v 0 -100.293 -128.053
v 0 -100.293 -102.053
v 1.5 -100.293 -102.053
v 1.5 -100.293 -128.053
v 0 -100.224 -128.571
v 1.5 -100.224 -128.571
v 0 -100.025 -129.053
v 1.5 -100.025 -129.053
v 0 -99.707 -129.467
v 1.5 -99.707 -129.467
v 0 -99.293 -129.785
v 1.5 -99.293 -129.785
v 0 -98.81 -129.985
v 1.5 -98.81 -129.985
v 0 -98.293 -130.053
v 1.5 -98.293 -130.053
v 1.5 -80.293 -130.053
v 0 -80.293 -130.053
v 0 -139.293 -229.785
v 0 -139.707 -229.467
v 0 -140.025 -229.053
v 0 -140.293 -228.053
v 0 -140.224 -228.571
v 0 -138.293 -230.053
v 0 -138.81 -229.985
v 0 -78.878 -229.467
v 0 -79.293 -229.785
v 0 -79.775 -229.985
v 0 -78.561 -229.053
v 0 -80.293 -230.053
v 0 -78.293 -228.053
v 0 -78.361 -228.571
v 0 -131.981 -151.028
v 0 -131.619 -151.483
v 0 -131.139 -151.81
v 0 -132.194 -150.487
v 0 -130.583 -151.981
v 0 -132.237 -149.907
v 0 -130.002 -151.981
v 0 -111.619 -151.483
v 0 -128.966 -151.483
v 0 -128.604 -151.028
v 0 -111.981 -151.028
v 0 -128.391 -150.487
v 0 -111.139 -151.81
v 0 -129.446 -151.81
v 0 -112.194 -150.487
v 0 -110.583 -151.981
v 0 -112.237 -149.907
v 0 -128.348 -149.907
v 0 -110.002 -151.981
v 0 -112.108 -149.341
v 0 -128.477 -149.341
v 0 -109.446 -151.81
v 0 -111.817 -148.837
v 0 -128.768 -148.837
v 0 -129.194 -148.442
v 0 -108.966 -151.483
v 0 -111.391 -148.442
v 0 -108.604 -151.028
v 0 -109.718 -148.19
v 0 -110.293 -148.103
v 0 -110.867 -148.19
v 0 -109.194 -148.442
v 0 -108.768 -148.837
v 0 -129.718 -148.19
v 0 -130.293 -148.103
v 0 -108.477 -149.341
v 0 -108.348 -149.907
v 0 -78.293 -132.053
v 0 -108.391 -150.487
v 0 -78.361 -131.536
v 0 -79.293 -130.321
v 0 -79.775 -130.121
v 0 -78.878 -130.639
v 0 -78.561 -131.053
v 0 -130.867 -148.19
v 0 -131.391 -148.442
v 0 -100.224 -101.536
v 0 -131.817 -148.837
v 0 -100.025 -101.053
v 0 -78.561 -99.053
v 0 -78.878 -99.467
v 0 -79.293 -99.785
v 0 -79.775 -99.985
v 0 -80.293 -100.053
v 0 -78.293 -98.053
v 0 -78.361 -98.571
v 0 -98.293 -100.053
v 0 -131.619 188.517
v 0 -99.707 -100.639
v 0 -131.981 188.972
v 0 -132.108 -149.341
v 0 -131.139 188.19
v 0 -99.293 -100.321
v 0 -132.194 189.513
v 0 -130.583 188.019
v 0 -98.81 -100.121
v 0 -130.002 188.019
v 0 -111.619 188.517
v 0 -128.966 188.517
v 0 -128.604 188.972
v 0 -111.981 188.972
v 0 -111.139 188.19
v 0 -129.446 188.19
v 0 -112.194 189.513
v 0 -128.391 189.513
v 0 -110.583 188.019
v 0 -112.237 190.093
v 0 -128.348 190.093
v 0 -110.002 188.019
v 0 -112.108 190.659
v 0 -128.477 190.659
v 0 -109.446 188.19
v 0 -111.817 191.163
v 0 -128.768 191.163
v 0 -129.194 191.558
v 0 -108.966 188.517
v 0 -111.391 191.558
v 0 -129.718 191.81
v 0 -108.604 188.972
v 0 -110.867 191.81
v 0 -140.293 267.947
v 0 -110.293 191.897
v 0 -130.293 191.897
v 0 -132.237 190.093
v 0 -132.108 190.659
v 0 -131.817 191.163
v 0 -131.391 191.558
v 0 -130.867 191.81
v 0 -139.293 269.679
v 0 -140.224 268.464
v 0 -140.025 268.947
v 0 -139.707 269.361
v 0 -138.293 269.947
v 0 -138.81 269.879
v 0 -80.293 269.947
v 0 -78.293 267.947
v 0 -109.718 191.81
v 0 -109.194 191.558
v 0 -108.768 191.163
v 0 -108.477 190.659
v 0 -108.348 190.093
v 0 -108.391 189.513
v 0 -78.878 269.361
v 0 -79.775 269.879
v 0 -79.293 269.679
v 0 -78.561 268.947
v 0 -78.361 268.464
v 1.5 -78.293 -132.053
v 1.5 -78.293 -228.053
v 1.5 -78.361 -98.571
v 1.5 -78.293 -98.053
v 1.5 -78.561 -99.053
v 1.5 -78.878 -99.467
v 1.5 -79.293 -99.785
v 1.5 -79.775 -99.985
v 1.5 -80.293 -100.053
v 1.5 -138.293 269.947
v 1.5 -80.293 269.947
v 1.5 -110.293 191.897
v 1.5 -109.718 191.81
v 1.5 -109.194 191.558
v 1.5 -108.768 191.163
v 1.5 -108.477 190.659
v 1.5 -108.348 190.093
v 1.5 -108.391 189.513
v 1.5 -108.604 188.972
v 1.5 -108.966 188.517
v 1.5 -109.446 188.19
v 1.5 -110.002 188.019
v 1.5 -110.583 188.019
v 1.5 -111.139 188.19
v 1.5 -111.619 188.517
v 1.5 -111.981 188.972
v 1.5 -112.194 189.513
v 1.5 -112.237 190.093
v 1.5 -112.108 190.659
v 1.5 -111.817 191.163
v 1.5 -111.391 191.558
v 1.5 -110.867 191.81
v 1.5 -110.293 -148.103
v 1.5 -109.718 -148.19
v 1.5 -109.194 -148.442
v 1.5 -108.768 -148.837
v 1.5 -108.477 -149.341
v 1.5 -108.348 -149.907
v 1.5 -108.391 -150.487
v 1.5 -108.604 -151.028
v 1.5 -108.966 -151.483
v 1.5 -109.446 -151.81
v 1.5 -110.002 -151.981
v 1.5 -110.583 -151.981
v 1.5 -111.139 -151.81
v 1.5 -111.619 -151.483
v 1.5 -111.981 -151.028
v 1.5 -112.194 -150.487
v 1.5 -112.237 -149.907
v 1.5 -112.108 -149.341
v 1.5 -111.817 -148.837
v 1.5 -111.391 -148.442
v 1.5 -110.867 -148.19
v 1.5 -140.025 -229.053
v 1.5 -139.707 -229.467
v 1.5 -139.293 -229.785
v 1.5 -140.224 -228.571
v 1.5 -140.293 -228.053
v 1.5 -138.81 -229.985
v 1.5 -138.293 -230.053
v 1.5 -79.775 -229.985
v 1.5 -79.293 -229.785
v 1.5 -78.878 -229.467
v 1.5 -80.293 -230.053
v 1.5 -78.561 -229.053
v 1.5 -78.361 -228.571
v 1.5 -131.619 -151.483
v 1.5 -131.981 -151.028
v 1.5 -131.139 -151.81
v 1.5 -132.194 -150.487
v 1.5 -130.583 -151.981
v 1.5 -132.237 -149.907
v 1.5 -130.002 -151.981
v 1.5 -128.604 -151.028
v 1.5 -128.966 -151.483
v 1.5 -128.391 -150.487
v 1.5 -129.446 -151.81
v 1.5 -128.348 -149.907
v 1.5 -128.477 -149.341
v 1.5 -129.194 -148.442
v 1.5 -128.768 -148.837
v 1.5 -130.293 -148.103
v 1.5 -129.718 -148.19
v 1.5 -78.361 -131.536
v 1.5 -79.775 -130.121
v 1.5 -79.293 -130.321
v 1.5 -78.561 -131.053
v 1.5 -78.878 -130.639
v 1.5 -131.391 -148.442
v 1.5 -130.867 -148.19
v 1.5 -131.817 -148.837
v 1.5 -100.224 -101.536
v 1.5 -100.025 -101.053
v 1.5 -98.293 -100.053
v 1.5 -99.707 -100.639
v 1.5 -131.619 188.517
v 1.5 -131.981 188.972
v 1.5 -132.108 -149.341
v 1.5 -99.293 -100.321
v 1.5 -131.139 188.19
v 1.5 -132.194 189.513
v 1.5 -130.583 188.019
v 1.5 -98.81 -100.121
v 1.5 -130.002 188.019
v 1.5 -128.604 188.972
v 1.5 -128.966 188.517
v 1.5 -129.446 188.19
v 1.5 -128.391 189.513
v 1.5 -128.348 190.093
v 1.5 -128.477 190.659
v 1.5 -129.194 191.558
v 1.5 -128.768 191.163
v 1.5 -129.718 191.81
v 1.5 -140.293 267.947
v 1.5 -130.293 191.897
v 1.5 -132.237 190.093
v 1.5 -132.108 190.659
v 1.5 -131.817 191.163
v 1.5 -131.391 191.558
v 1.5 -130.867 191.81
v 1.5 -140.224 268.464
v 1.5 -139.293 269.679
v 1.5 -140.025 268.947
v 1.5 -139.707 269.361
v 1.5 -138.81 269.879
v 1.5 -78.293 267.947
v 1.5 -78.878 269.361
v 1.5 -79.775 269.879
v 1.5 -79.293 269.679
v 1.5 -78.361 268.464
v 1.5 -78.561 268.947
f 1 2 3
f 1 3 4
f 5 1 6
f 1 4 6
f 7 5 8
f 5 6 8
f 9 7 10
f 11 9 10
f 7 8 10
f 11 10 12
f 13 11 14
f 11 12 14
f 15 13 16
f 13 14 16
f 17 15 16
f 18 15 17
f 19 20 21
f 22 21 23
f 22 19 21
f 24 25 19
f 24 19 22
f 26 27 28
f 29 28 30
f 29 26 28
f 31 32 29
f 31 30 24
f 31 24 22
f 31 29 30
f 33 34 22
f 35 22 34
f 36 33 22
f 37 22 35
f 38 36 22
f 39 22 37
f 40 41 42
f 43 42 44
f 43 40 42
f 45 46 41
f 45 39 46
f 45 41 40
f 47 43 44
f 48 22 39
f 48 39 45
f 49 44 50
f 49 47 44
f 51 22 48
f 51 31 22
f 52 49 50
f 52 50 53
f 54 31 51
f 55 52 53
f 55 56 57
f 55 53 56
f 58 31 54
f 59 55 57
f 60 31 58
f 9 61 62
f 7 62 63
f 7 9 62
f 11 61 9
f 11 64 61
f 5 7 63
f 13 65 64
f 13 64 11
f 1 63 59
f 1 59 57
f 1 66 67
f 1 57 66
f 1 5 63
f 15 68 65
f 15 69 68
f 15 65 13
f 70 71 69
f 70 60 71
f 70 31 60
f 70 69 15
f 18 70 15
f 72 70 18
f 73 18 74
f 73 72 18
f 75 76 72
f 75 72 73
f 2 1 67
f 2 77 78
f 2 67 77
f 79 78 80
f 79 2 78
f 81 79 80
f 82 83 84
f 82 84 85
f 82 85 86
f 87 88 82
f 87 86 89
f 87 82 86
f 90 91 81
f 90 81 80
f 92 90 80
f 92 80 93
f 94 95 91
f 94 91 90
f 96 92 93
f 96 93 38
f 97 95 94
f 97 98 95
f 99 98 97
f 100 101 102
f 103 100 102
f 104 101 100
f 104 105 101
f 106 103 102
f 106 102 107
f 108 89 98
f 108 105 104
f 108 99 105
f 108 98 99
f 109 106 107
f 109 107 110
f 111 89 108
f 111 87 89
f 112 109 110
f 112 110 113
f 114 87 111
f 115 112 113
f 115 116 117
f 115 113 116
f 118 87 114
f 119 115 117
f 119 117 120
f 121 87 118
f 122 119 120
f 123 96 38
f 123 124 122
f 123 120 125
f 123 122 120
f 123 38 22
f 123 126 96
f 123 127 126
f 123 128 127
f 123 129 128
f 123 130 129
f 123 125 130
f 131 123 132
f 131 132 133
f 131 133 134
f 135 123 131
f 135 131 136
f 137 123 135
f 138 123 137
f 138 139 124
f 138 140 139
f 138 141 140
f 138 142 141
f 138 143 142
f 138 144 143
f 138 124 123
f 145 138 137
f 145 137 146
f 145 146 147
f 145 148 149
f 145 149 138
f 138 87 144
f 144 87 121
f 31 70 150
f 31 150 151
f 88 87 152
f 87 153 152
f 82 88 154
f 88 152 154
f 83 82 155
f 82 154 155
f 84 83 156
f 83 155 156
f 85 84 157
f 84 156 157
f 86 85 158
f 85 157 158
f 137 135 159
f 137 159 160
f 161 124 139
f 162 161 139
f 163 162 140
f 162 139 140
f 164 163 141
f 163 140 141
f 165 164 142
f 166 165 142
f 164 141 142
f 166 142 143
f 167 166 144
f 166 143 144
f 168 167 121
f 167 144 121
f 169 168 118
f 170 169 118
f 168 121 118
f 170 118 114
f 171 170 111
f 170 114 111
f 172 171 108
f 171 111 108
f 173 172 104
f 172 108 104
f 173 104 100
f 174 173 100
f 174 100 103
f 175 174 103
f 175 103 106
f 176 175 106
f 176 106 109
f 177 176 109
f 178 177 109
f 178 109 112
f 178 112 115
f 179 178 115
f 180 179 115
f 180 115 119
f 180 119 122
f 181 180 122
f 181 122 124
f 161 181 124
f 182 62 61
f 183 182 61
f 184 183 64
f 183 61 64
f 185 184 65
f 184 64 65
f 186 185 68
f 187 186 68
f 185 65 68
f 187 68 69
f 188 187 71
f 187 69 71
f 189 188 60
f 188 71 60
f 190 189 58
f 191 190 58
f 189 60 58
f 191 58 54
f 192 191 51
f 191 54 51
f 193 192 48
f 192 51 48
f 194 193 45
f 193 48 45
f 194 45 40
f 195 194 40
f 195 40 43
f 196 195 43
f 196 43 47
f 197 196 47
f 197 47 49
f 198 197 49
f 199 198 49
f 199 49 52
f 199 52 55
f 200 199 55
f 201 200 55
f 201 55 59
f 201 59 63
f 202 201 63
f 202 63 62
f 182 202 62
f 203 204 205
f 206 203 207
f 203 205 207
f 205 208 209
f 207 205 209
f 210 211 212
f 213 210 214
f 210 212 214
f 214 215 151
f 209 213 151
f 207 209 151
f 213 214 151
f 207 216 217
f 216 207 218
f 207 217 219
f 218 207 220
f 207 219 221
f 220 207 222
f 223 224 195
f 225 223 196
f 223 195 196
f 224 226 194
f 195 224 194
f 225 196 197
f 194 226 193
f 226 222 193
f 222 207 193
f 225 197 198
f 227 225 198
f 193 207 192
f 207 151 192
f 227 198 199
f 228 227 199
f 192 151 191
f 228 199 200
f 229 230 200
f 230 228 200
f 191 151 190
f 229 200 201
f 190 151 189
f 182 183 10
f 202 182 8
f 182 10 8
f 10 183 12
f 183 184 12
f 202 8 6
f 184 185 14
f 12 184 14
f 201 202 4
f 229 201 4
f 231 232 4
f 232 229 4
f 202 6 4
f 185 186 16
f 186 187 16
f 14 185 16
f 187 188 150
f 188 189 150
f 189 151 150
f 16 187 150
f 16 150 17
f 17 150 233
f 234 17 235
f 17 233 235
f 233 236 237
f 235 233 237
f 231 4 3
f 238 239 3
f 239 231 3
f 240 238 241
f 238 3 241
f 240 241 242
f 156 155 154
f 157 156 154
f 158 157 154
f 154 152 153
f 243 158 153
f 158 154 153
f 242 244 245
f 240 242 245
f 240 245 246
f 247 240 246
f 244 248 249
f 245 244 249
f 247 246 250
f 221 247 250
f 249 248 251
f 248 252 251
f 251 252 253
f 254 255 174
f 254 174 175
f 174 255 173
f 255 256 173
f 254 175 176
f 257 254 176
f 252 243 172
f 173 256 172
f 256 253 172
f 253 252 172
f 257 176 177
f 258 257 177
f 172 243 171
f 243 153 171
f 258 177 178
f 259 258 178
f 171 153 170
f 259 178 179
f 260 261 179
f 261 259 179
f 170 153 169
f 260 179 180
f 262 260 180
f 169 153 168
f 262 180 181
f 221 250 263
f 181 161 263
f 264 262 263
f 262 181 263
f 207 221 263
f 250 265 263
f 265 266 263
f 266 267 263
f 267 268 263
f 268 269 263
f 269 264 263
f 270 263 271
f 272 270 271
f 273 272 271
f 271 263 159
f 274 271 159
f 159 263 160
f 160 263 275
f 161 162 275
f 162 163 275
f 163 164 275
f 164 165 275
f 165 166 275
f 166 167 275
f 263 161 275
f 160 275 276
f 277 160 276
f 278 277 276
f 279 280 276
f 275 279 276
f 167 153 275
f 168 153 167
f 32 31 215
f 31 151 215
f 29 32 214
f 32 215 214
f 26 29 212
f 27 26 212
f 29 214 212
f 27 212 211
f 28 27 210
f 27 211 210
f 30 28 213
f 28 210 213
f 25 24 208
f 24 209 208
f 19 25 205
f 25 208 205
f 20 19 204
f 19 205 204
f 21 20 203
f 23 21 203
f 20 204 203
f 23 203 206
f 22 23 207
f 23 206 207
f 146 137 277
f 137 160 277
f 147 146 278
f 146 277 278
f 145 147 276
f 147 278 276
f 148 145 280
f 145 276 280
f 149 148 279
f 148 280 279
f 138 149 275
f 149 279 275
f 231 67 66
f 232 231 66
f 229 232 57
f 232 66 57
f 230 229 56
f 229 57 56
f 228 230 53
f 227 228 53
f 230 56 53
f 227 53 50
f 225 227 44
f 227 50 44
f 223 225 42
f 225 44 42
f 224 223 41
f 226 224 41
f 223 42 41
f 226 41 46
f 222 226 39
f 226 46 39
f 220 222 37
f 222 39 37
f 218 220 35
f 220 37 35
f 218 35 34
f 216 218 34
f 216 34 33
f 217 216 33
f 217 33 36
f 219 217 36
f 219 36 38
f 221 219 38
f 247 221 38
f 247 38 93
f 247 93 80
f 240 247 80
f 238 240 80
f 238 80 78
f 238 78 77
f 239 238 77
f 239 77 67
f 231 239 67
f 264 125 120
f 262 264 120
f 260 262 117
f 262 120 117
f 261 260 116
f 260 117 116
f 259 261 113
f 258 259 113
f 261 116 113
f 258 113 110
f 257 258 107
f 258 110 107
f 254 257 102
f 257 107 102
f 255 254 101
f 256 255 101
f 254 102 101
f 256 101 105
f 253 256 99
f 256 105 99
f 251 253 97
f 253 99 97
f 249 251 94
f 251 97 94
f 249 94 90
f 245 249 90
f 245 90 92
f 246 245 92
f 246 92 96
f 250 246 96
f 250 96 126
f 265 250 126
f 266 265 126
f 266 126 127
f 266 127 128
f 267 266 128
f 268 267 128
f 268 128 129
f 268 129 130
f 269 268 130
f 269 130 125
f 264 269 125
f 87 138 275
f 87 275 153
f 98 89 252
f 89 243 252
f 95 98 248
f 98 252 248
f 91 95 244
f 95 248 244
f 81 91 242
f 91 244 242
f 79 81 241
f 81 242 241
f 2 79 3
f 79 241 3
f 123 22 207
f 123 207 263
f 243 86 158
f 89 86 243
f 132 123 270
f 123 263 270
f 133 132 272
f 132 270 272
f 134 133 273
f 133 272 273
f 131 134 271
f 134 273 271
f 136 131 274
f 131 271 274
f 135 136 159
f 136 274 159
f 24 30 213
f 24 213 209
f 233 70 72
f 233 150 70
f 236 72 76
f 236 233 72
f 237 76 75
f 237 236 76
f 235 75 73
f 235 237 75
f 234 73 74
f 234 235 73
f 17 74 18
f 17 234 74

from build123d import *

# Parameters (mm, degrees)
BOSS_EXTRUDE1_DEPTH = 1.5
FILLET1_R           = 2
SKETCH2_R           = 1.95
CUT_EXTRUDE1_DEPTH  = 10


with BuildPart() as part:
    # Sketch1 → Boss-Extrude1 (new body)
    with BuildSketch(Plane(origin=(0, 0, 0), x_dir=(0, 0, -1), z_dir=(1, 0, 0))):
        Polygon((130.053191489, -78.292553191), (230.053191489, -78.292553191), (230.053191489, -140.292553191), (-269.946808511, -140.292553191), (-269.946808511, -78.292553191), (100.053191489, -78.292553191), (100.053191489, -100.292553191), (130.053191489, -100.292553191), align=None)
    extrude(amount=BOSS_EXTRUDE1_DEPTH)

    # Fillet1
    fillet1_edges = [part.edges().sort_by_distance(p)[0] for p in [
        (0.75, -78.292553191, 269.946808511),
        (0.75, -78.292553191, -100.053191489),
        (0.75, -100.292553191, -100.053191489),
        (0.75, -100.292553191, -130.053191489),
        (0.75, -78.292553191, -130.053191489),
        (0.75, -78.292553191, -230.053191489),
        (0.75, -140.292553191, -230.053191489),
        (0.75, -140.292553191, 269.946808511),
    ]]
    fillet(fillet1_edges, radius=FILLET1_R)

    # Sketch2 → Cut-Extrude1 (cut)
    with BuildSketch(Plane.ZY):
        with Locations((-150.053191489, -110.292553191)):
            Circle(SKETCH2_R)
        with Locations((-150.053191489, -130.292553191)):
            Circle(SKETCH2_R)
        with Locations((189.946808511, -110.292553191)):
            Circle(SKETCH2_R)
        with Locations((189.946808511, -130.292553191)):
            Circle(SKETCH2_R)
    extrude(amount=-CUT_EXTRUDE1_DEPTH, mode=Mode.SUBTRACT)


solid = part.part
